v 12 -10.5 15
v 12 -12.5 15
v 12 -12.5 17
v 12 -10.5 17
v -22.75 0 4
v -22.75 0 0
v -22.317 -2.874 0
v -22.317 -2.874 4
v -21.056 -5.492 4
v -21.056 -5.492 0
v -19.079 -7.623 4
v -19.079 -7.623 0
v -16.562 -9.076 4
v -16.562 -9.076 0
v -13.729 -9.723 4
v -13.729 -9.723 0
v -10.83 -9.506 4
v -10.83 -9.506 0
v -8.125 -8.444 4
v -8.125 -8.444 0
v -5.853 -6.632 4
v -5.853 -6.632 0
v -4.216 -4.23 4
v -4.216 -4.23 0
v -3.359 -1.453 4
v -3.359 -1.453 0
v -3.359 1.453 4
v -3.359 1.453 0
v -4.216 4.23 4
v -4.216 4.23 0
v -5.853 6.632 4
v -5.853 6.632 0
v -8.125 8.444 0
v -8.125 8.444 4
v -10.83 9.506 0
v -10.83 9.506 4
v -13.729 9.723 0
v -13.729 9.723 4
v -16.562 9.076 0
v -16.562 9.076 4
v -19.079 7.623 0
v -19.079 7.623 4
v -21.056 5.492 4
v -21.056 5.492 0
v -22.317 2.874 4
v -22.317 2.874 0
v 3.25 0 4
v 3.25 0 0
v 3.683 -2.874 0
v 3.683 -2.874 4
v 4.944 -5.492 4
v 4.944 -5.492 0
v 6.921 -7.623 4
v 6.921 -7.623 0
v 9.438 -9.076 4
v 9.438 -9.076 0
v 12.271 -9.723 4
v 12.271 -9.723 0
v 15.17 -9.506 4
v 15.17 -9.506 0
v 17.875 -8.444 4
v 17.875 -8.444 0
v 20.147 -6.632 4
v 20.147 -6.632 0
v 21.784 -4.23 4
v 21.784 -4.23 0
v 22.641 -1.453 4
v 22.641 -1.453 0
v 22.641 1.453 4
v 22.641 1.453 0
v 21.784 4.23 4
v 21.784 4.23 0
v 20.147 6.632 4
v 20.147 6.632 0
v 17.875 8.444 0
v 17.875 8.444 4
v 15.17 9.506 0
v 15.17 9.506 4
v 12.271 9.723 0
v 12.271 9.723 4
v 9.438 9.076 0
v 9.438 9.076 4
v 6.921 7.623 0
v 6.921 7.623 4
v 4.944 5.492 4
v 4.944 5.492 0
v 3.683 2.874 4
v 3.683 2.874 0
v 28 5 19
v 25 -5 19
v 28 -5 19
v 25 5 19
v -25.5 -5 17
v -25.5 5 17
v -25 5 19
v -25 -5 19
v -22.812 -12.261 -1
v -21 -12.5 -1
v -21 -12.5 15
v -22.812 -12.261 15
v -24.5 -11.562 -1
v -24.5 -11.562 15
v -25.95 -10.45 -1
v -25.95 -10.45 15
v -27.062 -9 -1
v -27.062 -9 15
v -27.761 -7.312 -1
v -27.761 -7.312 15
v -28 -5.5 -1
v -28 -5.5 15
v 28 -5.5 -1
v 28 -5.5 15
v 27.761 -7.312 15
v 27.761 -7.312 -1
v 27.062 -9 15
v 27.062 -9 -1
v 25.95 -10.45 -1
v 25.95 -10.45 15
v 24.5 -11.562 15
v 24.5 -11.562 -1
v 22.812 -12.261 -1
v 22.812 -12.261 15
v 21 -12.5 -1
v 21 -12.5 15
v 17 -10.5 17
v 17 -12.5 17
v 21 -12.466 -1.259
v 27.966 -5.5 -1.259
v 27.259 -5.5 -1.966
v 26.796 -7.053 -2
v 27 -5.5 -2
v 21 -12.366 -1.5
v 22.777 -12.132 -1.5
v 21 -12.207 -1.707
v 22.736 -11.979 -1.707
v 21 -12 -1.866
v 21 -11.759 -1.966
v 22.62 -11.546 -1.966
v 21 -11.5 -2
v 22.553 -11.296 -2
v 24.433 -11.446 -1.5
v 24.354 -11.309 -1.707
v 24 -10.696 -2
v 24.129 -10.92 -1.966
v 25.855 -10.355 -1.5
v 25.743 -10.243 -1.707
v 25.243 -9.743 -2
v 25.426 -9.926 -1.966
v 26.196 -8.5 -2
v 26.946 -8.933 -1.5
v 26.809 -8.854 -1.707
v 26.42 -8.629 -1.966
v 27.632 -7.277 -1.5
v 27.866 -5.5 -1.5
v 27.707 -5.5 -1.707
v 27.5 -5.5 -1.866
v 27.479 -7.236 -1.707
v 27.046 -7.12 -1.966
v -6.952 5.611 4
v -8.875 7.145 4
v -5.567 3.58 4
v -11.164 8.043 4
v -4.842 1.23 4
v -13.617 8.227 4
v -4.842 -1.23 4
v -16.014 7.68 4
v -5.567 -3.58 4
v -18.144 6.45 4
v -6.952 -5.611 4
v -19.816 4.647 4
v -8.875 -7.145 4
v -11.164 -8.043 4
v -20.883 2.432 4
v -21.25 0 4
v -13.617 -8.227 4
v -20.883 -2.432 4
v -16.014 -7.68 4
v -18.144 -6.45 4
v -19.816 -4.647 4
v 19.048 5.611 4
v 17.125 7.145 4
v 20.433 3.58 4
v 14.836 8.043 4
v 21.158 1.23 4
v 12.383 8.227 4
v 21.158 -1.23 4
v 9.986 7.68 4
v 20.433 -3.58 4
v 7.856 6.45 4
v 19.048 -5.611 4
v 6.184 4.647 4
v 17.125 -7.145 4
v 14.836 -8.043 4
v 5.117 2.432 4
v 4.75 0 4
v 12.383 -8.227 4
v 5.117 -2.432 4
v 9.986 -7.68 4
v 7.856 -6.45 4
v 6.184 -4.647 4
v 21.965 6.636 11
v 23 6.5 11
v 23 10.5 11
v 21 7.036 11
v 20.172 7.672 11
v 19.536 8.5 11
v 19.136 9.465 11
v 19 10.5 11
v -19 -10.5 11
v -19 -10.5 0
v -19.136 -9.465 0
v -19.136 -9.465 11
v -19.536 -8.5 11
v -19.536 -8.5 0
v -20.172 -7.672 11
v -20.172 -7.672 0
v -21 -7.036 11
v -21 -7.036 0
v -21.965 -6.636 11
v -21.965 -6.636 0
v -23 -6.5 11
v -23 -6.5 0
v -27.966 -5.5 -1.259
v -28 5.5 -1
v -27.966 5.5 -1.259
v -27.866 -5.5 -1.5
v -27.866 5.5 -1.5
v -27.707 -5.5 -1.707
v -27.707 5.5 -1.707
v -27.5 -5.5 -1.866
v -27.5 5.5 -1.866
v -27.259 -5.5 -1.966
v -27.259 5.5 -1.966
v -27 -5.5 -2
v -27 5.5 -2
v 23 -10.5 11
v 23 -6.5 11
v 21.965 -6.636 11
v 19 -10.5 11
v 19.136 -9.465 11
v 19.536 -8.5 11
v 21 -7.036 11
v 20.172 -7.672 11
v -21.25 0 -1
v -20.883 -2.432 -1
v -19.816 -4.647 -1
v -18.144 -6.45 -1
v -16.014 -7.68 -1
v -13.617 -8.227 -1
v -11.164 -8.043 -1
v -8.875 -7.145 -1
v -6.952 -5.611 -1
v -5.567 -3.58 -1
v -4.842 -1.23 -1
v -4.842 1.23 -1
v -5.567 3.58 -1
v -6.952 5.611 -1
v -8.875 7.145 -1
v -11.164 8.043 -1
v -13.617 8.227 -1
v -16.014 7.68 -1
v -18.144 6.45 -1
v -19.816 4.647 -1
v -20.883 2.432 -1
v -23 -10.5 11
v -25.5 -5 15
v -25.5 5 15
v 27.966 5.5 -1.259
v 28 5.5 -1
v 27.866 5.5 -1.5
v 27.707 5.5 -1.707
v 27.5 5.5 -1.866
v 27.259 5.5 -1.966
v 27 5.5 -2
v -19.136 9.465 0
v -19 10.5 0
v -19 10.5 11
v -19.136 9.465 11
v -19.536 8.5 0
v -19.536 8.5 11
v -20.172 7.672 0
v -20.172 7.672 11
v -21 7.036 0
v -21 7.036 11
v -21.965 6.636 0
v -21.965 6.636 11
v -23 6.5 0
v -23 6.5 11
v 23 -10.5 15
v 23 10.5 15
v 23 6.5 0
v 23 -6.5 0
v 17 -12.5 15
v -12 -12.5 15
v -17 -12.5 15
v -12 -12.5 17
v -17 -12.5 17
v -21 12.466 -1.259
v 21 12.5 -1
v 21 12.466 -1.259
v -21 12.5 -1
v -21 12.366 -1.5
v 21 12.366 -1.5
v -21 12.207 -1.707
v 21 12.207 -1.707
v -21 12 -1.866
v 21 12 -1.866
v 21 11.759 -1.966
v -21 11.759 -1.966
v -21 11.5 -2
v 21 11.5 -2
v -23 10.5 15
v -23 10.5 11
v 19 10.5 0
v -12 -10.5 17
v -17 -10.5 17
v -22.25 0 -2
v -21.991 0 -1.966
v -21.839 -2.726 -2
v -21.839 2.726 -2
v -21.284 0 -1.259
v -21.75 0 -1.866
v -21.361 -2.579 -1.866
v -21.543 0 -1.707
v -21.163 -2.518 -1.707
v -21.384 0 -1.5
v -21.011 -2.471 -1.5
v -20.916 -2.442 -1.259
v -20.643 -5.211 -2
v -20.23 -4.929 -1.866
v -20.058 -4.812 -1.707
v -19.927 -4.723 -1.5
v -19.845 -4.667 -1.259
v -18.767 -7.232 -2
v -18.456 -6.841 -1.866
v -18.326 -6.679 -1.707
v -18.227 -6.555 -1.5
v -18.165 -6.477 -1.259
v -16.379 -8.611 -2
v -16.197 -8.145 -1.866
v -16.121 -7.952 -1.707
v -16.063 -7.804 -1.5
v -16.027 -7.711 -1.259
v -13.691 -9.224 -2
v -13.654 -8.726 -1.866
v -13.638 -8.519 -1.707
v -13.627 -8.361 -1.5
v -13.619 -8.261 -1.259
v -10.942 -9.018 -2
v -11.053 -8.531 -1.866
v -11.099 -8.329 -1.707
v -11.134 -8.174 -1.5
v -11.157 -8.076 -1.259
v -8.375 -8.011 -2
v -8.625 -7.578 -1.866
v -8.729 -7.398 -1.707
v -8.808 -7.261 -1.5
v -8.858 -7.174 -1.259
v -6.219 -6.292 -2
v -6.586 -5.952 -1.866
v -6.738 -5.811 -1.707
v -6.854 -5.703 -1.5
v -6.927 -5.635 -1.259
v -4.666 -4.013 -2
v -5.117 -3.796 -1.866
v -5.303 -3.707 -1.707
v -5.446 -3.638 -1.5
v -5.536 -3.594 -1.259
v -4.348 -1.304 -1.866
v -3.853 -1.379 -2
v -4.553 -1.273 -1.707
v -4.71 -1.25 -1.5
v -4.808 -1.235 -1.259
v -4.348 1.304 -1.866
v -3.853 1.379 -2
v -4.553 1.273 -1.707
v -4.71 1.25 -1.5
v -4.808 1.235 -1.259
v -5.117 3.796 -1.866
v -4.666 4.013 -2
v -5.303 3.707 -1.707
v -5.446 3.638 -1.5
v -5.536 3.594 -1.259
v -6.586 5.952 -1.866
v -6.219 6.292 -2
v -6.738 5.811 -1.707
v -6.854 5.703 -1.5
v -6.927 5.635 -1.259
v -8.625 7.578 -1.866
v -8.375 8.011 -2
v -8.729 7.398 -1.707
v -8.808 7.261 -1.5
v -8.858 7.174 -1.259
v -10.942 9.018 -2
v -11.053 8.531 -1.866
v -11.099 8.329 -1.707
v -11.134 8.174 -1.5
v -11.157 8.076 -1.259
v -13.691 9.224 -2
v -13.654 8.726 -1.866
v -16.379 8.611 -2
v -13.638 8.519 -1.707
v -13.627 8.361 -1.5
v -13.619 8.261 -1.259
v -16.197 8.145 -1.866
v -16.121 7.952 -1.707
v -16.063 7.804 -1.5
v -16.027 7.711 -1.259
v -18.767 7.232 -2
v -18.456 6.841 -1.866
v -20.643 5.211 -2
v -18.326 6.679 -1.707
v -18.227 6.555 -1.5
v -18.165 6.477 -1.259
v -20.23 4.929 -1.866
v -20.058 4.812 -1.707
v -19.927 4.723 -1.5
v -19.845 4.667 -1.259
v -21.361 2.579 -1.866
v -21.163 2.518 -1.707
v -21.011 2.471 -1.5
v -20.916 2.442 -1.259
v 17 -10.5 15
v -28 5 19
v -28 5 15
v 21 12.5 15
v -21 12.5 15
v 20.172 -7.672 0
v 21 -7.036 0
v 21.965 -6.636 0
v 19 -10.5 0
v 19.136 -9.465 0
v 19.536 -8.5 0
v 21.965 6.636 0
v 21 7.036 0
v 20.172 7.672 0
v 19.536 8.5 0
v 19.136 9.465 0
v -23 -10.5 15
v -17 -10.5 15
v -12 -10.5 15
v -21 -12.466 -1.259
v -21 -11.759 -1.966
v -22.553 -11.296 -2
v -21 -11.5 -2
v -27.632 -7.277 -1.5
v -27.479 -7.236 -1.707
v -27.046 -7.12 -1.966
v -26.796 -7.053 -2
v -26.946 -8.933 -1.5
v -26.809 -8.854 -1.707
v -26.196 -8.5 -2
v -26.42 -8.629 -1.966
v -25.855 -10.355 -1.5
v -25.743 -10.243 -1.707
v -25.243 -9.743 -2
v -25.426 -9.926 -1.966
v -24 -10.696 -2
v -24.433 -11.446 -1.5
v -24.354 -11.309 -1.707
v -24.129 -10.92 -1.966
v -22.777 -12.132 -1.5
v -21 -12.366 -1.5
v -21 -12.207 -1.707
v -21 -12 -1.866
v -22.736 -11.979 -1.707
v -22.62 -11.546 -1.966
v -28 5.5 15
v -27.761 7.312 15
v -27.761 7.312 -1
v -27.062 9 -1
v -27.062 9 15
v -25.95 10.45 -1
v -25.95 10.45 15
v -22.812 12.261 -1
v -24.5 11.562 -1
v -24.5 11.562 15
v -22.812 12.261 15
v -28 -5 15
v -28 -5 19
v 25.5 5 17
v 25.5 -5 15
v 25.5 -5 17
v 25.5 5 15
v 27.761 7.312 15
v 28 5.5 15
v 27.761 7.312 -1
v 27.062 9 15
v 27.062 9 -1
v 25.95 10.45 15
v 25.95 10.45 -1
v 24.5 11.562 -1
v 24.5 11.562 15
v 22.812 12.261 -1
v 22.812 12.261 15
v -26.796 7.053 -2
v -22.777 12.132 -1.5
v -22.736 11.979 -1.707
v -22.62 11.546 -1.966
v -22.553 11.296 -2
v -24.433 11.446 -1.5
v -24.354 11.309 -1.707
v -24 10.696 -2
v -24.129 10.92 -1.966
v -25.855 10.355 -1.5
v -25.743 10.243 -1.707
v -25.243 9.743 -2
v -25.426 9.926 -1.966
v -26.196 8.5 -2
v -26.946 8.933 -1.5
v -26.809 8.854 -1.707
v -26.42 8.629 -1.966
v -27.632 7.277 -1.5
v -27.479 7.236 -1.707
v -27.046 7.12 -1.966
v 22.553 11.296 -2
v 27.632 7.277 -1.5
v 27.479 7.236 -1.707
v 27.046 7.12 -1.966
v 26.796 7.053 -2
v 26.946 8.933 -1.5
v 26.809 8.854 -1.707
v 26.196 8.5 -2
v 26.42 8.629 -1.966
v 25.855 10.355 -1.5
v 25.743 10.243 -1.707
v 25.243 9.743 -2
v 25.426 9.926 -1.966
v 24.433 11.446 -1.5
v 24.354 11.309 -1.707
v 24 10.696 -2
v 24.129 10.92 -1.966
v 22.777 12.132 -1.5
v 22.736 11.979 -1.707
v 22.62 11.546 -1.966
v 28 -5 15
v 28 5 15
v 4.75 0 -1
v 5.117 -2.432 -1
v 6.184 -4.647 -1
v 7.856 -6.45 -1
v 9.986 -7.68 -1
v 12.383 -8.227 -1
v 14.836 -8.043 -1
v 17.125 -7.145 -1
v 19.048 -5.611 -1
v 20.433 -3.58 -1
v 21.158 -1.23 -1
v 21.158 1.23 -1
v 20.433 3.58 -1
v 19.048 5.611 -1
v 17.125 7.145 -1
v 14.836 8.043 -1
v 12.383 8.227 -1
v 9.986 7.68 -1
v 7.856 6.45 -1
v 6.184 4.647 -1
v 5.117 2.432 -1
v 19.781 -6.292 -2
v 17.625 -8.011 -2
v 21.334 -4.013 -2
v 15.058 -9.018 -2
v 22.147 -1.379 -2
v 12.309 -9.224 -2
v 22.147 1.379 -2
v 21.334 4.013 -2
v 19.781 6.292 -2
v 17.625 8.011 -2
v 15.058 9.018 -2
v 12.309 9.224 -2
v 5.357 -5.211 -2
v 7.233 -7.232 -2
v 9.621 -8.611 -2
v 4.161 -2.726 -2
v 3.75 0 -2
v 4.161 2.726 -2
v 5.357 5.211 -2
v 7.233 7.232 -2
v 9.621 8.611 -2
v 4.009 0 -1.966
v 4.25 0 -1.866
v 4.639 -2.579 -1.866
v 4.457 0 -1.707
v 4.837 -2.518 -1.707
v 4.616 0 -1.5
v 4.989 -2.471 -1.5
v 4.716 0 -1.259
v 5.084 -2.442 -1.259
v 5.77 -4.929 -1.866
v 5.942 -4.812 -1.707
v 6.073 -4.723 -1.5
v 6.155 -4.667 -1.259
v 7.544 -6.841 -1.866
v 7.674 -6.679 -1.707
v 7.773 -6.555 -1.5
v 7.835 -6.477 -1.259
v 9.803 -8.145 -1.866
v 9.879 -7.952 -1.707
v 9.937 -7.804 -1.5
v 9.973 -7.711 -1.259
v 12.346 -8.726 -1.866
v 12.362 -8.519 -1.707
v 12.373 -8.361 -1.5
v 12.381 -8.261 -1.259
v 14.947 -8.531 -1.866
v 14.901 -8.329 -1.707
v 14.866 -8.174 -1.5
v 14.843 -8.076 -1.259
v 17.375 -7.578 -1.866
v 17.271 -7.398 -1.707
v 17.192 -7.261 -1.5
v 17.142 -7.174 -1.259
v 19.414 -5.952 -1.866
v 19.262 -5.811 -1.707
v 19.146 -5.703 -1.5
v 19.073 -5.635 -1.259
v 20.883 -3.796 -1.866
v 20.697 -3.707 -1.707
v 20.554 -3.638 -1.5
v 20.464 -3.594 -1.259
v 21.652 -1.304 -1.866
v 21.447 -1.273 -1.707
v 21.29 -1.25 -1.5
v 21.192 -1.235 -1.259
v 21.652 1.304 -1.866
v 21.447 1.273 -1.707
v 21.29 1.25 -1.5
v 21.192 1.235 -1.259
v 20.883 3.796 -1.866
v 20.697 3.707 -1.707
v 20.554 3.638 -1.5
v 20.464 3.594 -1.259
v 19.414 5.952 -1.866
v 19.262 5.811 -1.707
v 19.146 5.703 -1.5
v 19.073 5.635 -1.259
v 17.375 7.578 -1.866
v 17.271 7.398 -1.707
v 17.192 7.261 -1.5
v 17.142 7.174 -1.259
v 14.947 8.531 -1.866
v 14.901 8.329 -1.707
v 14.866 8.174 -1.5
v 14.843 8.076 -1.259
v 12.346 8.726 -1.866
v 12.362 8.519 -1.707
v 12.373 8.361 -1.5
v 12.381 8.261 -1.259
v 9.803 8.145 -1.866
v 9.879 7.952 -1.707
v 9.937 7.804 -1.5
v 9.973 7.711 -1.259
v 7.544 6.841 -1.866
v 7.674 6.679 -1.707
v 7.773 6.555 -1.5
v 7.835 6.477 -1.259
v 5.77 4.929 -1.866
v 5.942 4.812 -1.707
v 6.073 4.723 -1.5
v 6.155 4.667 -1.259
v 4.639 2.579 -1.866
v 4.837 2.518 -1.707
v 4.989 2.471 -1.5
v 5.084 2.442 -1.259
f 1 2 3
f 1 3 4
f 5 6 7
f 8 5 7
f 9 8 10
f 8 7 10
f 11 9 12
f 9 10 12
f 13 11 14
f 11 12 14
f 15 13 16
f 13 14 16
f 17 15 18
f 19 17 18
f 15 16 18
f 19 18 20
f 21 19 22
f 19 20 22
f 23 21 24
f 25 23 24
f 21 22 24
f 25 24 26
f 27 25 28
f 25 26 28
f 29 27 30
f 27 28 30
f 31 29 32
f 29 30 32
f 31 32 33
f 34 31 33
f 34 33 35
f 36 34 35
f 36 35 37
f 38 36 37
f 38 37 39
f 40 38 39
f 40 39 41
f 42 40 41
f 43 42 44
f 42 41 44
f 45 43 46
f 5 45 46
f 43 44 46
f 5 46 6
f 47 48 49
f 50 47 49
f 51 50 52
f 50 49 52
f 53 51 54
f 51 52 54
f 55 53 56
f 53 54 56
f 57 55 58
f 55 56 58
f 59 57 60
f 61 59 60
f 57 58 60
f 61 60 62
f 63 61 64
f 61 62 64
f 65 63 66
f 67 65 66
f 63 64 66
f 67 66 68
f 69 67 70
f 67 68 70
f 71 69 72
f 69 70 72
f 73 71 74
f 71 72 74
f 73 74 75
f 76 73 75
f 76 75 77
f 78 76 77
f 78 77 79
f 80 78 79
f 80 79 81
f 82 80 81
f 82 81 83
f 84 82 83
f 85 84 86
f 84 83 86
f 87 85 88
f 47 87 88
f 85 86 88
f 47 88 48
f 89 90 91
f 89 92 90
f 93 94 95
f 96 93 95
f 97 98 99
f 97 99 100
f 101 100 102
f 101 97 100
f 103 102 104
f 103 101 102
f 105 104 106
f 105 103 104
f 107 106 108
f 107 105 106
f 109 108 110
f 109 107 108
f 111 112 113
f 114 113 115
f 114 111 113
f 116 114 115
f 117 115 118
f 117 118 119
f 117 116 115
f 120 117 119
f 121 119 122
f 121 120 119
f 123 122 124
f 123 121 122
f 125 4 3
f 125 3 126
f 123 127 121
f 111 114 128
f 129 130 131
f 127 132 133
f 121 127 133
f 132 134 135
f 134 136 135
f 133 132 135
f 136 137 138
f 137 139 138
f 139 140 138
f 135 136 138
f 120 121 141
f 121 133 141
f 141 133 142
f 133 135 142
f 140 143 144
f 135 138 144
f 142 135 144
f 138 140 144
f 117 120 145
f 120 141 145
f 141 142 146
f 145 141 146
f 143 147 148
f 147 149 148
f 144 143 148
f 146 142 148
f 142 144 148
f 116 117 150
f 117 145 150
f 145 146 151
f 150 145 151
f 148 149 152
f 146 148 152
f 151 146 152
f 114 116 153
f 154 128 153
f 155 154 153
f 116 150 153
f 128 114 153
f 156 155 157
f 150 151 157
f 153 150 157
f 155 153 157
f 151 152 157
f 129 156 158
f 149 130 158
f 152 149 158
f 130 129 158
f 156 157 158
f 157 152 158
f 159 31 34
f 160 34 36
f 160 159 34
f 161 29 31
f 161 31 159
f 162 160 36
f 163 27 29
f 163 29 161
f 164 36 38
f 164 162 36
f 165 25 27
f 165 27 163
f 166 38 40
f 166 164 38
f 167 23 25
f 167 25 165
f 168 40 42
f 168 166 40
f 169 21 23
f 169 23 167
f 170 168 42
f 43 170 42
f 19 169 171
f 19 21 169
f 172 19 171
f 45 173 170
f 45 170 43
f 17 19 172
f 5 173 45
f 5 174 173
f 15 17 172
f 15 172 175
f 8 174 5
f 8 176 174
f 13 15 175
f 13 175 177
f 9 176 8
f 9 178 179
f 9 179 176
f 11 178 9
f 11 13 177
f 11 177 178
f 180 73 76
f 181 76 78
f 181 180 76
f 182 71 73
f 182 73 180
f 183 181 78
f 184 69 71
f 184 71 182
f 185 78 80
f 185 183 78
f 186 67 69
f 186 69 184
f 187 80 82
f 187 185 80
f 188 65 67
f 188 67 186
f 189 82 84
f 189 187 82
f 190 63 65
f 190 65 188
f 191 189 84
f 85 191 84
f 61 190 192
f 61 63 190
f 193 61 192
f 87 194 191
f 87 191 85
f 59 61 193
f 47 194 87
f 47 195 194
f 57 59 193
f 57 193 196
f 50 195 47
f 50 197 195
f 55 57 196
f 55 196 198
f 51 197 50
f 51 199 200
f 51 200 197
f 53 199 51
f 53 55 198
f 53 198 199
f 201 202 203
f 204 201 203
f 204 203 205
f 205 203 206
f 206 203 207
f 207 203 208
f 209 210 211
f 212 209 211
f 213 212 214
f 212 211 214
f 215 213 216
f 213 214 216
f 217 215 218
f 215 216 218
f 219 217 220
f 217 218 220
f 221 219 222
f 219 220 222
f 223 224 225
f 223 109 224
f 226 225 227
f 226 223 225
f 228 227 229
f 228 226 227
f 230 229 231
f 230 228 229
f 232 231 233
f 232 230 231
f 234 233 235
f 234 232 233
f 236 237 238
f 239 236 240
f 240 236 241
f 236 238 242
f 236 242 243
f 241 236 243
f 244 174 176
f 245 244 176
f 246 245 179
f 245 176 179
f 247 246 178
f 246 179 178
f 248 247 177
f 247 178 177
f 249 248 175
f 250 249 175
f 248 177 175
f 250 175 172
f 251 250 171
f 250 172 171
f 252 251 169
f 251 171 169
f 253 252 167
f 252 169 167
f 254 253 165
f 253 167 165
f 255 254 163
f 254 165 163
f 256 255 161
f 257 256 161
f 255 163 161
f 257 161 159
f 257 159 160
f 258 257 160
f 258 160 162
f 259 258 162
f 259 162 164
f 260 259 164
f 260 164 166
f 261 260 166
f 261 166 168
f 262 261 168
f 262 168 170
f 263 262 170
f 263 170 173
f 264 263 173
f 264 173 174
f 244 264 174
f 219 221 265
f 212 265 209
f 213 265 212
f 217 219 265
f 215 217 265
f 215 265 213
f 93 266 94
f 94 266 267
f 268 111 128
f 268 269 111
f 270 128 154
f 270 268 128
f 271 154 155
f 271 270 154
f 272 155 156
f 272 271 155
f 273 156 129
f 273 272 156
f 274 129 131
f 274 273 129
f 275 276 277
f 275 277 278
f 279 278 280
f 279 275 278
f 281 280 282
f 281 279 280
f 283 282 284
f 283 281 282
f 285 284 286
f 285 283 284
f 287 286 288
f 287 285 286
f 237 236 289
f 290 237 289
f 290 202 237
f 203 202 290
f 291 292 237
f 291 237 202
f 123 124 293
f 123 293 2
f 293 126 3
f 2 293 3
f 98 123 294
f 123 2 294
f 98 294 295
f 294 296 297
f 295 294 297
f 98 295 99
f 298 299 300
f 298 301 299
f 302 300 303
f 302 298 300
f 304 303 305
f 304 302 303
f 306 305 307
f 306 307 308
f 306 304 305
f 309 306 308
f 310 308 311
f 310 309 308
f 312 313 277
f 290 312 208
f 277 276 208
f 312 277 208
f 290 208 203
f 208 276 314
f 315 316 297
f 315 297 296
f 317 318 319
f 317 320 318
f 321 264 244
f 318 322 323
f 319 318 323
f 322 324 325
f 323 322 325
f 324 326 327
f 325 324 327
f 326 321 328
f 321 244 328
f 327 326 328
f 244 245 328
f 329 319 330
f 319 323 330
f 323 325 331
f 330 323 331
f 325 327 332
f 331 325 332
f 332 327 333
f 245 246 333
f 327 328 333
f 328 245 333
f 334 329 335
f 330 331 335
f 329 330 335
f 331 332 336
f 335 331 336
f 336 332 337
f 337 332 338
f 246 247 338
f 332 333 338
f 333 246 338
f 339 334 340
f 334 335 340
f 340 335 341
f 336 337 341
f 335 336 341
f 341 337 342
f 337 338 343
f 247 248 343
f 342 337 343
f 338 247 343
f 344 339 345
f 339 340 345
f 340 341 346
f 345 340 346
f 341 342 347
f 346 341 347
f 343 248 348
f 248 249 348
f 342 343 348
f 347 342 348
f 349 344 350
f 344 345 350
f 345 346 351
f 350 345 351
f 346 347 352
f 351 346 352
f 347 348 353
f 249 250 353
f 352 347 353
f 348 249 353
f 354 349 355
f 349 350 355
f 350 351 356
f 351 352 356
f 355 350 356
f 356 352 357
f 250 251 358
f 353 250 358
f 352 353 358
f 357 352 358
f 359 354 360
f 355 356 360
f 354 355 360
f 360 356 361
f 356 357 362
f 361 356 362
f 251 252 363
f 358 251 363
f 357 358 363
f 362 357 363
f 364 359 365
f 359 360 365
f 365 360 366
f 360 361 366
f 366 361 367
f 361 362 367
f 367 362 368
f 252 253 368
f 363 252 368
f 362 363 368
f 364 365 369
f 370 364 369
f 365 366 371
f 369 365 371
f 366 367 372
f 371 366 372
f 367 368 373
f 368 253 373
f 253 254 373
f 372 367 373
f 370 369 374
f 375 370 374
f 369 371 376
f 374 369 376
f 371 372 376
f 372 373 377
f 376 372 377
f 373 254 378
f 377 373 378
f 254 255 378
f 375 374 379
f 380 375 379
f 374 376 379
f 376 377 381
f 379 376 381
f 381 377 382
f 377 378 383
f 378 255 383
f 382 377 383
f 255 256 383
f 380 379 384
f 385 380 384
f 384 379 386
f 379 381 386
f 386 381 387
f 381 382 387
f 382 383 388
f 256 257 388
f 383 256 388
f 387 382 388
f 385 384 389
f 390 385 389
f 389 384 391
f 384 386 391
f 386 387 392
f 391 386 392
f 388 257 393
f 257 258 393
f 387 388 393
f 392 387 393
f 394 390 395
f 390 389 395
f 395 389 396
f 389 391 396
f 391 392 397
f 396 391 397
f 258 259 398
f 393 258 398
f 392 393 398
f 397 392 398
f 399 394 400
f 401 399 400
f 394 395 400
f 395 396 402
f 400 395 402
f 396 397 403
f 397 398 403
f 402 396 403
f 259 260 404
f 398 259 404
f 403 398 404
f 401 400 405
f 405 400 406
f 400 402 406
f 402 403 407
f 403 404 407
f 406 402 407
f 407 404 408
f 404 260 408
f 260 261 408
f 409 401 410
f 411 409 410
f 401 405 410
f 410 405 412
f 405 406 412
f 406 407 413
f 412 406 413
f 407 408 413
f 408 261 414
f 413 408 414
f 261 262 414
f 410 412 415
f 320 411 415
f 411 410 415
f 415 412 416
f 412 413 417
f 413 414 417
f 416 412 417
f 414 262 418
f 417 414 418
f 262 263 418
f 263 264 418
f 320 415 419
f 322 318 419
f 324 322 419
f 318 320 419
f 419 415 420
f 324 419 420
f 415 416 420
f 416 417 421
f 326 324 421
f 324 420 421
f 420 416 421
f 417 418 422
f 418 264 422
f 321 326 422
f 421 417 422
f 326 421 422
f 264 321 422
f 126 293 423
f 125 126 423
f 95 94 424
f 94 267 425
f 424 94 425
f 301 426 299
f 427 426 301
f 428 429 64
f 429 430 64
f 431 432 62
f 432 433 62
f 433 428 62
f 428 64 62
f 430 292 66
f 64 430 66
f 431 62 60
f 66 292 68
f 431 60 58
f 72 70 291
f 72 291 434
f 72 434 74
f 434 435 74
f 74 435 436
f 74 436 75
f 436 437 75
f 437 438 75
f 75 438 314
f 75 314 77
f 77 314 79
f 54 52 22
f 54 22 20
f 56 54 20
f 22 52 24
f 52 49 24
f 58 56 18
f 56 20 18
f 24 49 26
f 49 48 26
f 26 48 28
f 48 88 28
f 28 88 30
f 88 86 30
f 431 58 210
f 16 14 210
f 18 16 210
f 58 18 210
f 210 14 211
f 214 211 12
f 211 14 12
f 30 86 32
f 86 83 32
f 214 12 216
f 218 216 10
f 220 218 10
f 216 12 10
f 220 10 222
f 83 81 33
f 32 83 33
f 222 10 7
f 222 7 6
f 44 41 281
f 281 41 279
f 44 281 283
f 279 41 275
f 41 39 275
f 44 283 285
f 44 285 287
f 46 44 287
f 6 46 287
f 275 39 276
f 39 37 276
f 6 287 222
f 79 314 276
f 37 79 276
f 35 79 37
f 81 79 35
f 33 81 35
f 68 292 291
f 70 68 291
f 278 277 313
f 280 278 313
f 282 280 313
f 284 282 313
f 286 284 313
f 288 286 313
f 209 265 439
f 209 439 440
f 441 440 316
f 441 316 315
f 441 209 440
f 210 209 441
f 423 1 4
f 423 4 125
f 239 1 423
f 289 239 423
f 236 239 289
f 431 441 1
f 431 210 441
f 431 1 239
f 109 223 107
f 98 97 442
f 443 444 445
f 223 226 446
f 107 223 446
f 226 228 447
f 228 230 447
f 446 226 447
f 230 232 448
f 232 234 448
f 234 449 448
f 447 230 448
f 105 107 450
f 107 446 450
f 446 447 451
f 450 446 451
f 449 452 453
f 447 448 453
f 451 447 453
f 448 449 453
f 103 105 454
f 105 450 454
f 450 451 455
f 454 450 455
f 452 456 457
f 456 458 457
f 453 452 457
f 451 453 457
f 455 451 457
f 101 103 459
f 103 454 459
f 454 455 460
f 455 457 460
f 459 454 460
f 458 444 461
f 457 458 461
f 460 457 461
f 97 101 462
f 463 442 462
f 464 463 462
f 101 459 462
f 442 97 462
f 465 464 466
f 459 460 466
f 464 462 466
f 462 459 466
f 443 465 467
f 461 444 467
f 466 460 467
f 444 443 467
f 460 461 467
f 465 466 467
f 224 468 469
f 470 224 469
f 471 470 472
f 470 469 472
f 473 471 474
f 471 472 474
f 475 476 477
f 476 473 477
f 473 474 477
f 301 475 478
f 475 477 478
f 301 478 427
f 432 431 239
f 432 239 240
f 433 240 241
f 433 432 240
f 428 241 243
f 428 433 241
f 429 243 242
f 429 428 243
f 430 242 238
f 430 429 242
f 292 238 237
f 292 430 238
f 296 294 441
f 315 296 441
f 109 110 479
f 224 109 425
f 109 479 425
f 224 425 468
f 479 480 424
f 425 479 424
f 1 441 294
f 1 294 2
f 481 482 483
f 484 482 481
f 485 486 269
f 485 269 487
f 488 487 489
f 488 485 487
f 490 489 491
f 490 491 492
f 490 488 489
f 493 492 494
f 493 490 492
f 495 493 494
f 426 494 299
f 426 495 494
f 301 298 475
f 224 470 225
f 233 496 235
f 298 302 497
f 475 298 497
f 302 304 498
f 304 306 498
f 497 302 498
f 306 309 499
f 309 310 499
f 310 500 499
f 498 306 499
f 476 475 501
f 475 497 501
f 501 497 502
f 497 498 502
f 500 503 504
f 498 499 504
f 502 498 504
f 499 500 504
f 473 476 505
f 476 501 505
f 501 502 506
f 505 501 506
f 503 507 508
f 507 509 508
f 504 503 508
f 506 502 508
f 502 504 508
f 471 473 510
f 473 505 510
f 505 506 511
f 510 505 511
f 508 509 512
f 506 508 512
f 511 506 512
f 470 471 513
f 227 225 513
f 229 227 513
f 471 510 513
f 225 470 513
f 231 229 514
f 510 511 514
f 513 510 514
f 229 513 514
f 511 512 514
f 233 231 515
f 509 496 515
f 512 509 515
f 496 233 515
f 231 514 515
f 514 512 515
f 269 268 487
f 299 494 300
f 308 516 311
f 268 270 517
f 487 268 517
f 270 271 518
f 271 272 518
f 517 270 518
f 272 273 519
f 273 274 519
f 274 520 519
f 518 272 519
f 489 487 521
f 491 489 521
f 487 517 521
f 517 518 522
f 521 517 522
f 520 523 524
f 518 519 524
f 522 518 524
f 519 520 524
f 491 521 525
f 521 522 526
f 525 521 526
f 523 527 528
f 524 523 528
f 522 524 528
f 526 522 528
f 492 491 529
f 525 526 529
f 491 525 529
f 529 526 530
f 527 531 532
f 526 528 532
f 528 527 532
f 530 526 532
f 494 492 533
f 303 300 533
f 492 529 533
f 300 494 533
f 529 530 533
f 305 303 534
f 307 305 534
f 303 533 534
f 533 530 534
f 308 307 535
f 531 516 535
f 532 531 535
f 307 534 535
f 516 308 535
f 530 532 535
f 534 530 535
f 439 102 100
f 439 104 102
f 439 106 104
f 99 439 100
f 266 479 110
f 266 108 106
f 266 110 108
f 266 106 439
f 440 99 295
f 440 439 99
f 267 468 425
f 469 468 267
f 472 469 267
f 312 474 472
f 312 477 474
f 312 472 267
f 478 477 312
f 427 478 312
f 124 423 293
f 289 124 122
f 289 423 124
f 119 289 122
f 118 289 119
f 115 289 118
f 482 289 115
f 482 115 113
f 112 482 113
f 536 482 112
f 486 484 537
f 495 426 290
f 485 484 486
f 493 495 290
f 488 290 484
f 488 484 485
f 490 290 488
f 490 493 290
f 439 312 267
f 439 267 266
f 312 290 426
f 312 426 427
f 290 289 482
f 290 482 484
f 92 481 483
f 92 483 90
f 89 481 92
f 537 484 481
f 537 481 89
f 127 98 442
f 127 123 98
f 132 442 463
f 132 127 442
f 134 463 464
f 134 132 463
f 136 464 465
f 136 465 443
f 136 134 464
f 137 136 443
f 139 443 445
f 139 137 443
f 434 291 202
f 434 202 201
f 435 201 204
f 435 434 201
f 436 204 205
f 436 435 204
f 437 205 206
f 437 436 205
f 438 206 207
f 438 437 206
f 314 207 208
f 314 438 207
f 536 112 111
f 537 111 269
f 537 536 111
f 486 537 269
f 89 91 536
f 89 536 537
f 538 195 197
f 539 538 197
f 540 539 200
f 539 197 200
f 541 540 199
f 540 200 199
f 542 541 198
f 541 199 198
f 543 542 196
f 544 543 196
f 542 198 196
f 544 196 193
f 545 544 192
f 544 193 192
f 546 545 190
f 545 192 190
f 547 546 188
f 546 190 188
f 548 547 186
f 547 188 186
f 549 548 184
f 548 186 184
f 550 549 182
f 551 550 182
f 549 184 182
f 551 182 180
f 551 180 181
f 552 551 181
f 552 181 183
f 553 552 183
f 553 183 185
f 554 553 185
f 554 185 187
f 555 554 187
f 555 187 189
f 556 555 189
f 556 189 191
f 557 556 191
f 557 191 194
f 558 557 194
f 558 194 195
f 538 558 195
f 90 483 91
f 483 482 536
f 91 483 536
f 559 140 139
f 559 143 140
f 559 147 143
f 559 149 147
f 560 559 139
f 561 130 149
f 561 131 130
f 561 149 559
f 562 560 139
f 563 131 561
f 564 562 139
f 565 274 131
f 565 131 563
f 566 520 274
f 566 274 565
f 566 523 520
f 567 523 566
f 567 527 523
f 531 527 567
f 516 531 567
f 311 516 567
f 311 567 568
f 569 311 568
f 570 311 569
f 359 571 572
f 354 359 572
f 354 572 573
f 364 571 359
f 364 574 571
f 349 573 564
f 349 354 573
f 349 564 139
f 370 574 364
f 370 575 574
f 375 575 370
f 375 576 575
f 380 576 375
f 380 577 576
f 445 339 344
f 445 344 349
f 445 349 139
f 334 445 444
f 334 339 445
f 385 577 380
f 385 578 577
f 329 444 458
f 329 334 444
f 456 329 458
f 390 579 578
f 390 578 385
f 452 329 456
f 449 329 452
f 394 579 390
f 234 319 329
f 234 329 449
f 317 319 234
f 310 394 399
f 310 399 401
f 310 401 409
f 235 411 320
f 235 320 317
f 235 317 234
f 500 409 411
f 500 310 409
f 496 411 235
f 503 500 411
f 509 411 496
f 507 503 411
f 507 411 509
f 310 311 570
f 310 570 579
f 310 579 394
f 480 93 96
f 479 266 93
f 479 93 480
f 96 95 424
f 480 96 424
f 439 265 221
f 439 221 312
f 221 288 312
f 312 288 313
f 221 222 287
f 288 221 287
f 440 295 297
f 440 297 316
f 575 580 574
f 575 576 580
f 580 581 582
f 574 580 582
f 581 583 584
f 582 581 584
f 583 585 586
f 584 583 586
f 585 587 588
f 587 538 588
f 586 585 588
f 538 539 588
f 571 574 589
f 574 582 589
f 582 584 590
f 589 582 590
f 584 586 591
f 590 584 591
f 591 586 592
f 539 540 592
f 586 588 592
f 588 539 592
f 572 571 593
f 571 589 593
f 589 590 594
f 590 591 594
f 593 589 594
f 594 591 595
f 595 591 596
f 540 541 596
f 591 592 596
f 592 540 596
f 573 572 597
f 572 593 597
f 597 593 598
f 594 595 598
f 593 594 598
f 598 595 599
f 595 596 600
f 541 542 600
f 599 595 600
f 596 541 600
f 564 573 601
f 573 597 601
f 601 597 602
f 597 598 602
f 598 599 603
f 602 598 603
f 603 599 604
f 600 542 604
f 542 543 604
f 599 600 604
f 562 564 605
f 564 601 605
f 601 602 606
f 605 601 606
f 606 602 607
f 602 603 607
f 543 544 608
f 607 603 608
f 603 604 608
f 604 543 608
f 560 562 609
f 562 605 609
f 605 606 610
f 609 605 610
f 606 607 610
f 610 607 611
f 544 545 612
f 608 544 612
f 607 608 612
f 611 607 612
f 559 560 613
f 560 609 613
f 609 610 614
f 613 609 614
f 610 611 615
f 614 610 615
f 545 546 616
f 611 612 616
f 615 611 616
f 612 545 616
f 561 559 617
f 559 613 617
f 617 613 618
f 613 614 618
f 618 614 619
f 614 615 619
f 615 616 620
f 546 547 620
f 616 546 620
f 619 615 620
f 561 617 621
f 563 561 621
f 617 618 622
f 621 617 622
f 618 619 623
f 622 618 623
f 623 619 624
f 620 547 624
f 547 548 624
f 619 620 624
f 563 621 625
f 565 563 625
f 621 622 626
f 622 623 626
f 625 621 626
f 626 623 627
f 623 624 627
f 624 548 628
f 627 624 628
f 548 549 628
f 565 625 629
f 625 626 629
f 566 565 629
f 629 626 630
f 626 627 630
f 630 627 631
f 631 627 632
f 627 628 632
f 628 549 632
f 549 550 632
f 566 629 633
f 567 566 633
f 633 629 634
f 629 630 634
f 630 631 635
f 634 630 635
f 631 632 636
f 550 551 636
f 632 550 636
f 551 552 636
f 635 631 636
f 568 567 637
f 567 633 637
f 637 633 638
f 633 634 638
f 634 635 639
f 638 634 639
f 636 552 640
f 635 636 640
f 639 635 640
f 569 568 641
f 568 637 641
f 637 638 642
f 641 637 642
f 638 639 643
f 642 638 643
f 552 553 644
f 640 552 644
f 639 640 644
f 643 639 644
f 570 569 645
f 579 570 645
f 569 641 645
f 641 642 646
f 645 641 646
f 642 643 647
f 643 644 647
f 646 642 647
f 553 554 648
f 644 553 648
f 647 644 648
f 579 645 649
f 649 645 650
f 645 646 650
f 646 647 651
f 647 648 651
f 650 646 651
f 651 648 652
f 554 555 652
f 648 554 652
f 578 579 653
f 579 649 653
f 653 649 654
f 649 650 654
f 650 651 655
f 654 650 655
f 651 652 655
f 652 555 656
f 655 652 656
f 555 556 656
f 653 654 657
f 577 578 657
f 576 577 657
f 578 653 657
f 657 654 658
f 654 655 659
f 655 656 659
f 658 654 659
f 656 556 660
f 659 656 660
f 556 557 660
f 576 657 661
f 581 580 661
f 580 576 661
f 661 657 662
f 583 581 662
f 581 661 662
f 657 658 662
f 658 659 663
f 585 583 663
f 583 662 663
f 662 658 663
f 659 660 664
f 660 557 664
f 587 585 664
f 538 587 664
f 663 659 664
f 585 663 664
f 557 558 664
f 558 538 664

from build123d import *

# Parameters (mm, degrees)
SKETCH2_W                      = 56
SKETCH2_H                      = 25
SKETCH2_W_2                    = 46
SKETCH2_H_2                    = 21
BOX_DEPTH                      = 15
SKETCH3_W                      = 56
SKETCH3_H                      = 25
FRONT_DEPTH                    = 2
SKETCH8_R                      = 9.75
BOSS_EXTRUDE7_DEPTH            = 4
SKETCH1_R                      = 8.25
CUT_EXTRUDE1_DEPTH             = 35.135758377
CUT_EXTRUDE1_DIRECTION_2_REACH = 36.136
FILLET1_R                      = 7
BOSS_EXTRUDE3_DEPTH            = 11
FILLET2_R                      = 1
FILLET3_R                      = 1
SKETCH5_W                      = 2.5
SKETCH5_H                      = 10
BOSS_EXTRUDE4_DEPTH            = 4
SKETCH6_W                      = 5
SKETCH6_H                      = 2
BOSS_EXTRUDE5_DEPTH            = 2
BOSS_EXTRUDE6_DEPTH            = 10


with BuildPart() as part:
    # Sketch2 → Box (new body)
    with BuildSketch(Plane.XY):
        Rectangle(SKETCH2_W, SKETCH2_H)
        Rectangle(SKETCH2_W_2, SKETCH2_H_2, mode=Mode.SUBTRACT)
    extrude(amount=BOX_DEPTH)

    # Sketch3 → Front (add)
    with BuildSketch(Plane(origin=(0, 0, 0), x_dir=(-1, 0, 0), z_dir=(0, 0, -1))):
        Rectangle(SKETCH3_W, SKETCH3_H)
    extrude(amount=FRONT_DEPTH)

    # Sketch8 → Boss-Extrude7 (add)
    with BuildSketch(Plane.XY):
        with Locations(Location((-13, 0, 0), (0, 0, 180))):
            Circle(SKETCH8_R)
        with Locations(Location((13, 0, 0), (0, 0, 180))):
            Circle(SKETCH8_R)
    extrude(amount=BOSS_EXTRUDE7_DEPTH)

    # Sketch1 → Cut-Extrude1 (cut)
    with BuildSketch(Plane.XY):
        with Locations(Location((-13, 0, 0), (0, 0, 180))):
            Circle(SKETCH1_R)
        with Locations(Location((13, 0, 0), (0, 0, 180))):
            Circle(SKETCH1_R)
    extrude(amount=-CUT_EXTRUDE1_DEPTH, mode=Mode.SUBTRACT)

    # Sketch1 → Cut-Extrude1 direction 2 (cut, up to next)
    with BuildSketch(Plane.XY, mode=Mode.PRIVATE) as cut_extrude1_direction_2_sk1:
        with Locations(Location((-13, 0, 0), (0, 0, 180))):
            Circle(SKETCH1_R)
    cut_extrude1_direction_2_tool1 = extrude(cut_extrude1_direction_2_sk1.sketch, amount=CUT_EXTRUDE1_DIRECTION_2_REACH, mode=Mode.PRIVATE) & part.part
    # Sketch1 → Cut-Extrude1 direction 2 (cut, up to next)
    with BuildSketch(Plane.XY, mode=Mode.PRIVATE) as cut_extrude1_direction_2_sk2:
        with Locations(Location((13, 0, 0), (0, 0, 180))):
            Circle(SKETCH1_R)
    cut_extrude1_direction_2_tool2 = extrude(cut_extrude1_direction_2_sk2.sketch, amount=CUT_EXTRUDE1_DIRECTION_2_REACH, mode=Mode.PRIVATE) & part.part
    add(cut_extrude1_direction_2_tool1.solids().sort_by_distance((-13, 0, 0))[0], mode=Mode.SUBTRACT)
    add(cut_extrude1_direction_2_tool2.solids().sort_by_distance((13, 0, 0))[0], mode=Mode.SUBTRACT)

    # Fillet1
    fillet1_edges = [part.edges().sort_by_distance(p)[0] for p in [
        (-28, 12.5, 6.5),
        (28, 12.5, 6.5),
        (28, -12.5, 6.5),
        (-28, -12.5, 6.5),
    ]]
    fillet(fillet1_edges, radius=FILLET1_R)

    # Sketch4 → Boss-Extrude3 (add)
    with BuildSketch(Plane.XY):
        with BuildLine():
            Line((-23, 6.5), (-23, 10.5))
            Line((-23, 10.5), (-19, 10.5))
            ThreePointArc((-19, 10.5), (-20.171572875, 7.671572875), (-23, 6.5))
        make_face()
        with BuildLine():
            Line((19, 10.5), (23, 10.5))
            Line((23, 10.5), (23, 6.5))
            ThreePointArc((23, 6.5), (20.171572875, 7.671572875), (19, 10.5))
        make_face()
        with BuildLine():
            Line((-23, -6.5), (-23, -10.5))
            Line((-23, -10.5), (-19, -10.5))
            ThreePointArc((-19, -10.5), (-20.171572875, -7.671572875), (-23, -6.5))
        make_face()
        with BuildLine():
            Line((23, -6.5), (23, -10.5))
            Line((23, -10.5), (19, -10.5))
            ThreePointArc((19, -10.5), (20.171572875, -7.671572875), (23, -6.5))
        make_face()
    extrude(amount=BOSS_EXTRUDE3_DEPTH)

    # Fillet2
    fillet2_edges = [part.edges().sort_by_distance(p)[0] for p in [
        (0, 12.5, -2),
        (28, 0, -2),
        (0, -12.5, -2),
        (-28, 0, -2),
        (-25.949747468, -10.449747468, -2),
        (25.949747468, -10.449747468, -2),
        (-25.949747468, 10.449747468, -2),
        (25.949747468, 10.449747468, -2),
    ]]
    fillet(fillet2_edges, radius=FILLET2_R)

    # Fillet3
    fillet3_edges = [part.edges().sort_by_distance(p)[0] for p in [
        (-4.75, 0, -2),
        (21.25, 0, -2),
    ]]
    fillet(fillet3_edges, radius=FILLET3_R)

    # Sketch5 → Boss-Extrude4 (add)
    with BuildSketch(Plane.XY.offset(15)):
        with Locations((-26.75, 0)):
            Rectangle(SKETCH5_W, SKETCH5_H)
        with Locations((26.75, 0)):
            Rectangle(SKETCH5_W, SKETCH5_H)
    extrude(amount=BOSS_EXTRUDE4_DEPTH)

    # Sketch6 → Boss-Extrude5 (add)
    with BuildSketch(Plane.XY.offset(15)):
        with Locations((-14.5, -11.5)):
            Rectangle(SKETCH6_W, SKETCH6_H)
        with Locations((14.5, -11.5)):
            Rectangle(SKETCH6_W, SKETCH6_H)
    extrude(amount=BOSS_EXTRUDE5_DEPTH)

    # Sketch7 → Boss-Extrude6 (add)
    with BuildSketch(Plane(origin=(0, 5, 0), x_dir=(1, 0, 0), z_dir=(0, 1, 0))):
        Polygon((-25.5, -17), (-25, -19), (-25.5, -19), align=None)
        Polygon((25.5, -19), (25.5, -17), (25, -19), align=None)
    extrude(amount=-BOSS_EXTRUDE6_DEPTH)


solid = part.part
